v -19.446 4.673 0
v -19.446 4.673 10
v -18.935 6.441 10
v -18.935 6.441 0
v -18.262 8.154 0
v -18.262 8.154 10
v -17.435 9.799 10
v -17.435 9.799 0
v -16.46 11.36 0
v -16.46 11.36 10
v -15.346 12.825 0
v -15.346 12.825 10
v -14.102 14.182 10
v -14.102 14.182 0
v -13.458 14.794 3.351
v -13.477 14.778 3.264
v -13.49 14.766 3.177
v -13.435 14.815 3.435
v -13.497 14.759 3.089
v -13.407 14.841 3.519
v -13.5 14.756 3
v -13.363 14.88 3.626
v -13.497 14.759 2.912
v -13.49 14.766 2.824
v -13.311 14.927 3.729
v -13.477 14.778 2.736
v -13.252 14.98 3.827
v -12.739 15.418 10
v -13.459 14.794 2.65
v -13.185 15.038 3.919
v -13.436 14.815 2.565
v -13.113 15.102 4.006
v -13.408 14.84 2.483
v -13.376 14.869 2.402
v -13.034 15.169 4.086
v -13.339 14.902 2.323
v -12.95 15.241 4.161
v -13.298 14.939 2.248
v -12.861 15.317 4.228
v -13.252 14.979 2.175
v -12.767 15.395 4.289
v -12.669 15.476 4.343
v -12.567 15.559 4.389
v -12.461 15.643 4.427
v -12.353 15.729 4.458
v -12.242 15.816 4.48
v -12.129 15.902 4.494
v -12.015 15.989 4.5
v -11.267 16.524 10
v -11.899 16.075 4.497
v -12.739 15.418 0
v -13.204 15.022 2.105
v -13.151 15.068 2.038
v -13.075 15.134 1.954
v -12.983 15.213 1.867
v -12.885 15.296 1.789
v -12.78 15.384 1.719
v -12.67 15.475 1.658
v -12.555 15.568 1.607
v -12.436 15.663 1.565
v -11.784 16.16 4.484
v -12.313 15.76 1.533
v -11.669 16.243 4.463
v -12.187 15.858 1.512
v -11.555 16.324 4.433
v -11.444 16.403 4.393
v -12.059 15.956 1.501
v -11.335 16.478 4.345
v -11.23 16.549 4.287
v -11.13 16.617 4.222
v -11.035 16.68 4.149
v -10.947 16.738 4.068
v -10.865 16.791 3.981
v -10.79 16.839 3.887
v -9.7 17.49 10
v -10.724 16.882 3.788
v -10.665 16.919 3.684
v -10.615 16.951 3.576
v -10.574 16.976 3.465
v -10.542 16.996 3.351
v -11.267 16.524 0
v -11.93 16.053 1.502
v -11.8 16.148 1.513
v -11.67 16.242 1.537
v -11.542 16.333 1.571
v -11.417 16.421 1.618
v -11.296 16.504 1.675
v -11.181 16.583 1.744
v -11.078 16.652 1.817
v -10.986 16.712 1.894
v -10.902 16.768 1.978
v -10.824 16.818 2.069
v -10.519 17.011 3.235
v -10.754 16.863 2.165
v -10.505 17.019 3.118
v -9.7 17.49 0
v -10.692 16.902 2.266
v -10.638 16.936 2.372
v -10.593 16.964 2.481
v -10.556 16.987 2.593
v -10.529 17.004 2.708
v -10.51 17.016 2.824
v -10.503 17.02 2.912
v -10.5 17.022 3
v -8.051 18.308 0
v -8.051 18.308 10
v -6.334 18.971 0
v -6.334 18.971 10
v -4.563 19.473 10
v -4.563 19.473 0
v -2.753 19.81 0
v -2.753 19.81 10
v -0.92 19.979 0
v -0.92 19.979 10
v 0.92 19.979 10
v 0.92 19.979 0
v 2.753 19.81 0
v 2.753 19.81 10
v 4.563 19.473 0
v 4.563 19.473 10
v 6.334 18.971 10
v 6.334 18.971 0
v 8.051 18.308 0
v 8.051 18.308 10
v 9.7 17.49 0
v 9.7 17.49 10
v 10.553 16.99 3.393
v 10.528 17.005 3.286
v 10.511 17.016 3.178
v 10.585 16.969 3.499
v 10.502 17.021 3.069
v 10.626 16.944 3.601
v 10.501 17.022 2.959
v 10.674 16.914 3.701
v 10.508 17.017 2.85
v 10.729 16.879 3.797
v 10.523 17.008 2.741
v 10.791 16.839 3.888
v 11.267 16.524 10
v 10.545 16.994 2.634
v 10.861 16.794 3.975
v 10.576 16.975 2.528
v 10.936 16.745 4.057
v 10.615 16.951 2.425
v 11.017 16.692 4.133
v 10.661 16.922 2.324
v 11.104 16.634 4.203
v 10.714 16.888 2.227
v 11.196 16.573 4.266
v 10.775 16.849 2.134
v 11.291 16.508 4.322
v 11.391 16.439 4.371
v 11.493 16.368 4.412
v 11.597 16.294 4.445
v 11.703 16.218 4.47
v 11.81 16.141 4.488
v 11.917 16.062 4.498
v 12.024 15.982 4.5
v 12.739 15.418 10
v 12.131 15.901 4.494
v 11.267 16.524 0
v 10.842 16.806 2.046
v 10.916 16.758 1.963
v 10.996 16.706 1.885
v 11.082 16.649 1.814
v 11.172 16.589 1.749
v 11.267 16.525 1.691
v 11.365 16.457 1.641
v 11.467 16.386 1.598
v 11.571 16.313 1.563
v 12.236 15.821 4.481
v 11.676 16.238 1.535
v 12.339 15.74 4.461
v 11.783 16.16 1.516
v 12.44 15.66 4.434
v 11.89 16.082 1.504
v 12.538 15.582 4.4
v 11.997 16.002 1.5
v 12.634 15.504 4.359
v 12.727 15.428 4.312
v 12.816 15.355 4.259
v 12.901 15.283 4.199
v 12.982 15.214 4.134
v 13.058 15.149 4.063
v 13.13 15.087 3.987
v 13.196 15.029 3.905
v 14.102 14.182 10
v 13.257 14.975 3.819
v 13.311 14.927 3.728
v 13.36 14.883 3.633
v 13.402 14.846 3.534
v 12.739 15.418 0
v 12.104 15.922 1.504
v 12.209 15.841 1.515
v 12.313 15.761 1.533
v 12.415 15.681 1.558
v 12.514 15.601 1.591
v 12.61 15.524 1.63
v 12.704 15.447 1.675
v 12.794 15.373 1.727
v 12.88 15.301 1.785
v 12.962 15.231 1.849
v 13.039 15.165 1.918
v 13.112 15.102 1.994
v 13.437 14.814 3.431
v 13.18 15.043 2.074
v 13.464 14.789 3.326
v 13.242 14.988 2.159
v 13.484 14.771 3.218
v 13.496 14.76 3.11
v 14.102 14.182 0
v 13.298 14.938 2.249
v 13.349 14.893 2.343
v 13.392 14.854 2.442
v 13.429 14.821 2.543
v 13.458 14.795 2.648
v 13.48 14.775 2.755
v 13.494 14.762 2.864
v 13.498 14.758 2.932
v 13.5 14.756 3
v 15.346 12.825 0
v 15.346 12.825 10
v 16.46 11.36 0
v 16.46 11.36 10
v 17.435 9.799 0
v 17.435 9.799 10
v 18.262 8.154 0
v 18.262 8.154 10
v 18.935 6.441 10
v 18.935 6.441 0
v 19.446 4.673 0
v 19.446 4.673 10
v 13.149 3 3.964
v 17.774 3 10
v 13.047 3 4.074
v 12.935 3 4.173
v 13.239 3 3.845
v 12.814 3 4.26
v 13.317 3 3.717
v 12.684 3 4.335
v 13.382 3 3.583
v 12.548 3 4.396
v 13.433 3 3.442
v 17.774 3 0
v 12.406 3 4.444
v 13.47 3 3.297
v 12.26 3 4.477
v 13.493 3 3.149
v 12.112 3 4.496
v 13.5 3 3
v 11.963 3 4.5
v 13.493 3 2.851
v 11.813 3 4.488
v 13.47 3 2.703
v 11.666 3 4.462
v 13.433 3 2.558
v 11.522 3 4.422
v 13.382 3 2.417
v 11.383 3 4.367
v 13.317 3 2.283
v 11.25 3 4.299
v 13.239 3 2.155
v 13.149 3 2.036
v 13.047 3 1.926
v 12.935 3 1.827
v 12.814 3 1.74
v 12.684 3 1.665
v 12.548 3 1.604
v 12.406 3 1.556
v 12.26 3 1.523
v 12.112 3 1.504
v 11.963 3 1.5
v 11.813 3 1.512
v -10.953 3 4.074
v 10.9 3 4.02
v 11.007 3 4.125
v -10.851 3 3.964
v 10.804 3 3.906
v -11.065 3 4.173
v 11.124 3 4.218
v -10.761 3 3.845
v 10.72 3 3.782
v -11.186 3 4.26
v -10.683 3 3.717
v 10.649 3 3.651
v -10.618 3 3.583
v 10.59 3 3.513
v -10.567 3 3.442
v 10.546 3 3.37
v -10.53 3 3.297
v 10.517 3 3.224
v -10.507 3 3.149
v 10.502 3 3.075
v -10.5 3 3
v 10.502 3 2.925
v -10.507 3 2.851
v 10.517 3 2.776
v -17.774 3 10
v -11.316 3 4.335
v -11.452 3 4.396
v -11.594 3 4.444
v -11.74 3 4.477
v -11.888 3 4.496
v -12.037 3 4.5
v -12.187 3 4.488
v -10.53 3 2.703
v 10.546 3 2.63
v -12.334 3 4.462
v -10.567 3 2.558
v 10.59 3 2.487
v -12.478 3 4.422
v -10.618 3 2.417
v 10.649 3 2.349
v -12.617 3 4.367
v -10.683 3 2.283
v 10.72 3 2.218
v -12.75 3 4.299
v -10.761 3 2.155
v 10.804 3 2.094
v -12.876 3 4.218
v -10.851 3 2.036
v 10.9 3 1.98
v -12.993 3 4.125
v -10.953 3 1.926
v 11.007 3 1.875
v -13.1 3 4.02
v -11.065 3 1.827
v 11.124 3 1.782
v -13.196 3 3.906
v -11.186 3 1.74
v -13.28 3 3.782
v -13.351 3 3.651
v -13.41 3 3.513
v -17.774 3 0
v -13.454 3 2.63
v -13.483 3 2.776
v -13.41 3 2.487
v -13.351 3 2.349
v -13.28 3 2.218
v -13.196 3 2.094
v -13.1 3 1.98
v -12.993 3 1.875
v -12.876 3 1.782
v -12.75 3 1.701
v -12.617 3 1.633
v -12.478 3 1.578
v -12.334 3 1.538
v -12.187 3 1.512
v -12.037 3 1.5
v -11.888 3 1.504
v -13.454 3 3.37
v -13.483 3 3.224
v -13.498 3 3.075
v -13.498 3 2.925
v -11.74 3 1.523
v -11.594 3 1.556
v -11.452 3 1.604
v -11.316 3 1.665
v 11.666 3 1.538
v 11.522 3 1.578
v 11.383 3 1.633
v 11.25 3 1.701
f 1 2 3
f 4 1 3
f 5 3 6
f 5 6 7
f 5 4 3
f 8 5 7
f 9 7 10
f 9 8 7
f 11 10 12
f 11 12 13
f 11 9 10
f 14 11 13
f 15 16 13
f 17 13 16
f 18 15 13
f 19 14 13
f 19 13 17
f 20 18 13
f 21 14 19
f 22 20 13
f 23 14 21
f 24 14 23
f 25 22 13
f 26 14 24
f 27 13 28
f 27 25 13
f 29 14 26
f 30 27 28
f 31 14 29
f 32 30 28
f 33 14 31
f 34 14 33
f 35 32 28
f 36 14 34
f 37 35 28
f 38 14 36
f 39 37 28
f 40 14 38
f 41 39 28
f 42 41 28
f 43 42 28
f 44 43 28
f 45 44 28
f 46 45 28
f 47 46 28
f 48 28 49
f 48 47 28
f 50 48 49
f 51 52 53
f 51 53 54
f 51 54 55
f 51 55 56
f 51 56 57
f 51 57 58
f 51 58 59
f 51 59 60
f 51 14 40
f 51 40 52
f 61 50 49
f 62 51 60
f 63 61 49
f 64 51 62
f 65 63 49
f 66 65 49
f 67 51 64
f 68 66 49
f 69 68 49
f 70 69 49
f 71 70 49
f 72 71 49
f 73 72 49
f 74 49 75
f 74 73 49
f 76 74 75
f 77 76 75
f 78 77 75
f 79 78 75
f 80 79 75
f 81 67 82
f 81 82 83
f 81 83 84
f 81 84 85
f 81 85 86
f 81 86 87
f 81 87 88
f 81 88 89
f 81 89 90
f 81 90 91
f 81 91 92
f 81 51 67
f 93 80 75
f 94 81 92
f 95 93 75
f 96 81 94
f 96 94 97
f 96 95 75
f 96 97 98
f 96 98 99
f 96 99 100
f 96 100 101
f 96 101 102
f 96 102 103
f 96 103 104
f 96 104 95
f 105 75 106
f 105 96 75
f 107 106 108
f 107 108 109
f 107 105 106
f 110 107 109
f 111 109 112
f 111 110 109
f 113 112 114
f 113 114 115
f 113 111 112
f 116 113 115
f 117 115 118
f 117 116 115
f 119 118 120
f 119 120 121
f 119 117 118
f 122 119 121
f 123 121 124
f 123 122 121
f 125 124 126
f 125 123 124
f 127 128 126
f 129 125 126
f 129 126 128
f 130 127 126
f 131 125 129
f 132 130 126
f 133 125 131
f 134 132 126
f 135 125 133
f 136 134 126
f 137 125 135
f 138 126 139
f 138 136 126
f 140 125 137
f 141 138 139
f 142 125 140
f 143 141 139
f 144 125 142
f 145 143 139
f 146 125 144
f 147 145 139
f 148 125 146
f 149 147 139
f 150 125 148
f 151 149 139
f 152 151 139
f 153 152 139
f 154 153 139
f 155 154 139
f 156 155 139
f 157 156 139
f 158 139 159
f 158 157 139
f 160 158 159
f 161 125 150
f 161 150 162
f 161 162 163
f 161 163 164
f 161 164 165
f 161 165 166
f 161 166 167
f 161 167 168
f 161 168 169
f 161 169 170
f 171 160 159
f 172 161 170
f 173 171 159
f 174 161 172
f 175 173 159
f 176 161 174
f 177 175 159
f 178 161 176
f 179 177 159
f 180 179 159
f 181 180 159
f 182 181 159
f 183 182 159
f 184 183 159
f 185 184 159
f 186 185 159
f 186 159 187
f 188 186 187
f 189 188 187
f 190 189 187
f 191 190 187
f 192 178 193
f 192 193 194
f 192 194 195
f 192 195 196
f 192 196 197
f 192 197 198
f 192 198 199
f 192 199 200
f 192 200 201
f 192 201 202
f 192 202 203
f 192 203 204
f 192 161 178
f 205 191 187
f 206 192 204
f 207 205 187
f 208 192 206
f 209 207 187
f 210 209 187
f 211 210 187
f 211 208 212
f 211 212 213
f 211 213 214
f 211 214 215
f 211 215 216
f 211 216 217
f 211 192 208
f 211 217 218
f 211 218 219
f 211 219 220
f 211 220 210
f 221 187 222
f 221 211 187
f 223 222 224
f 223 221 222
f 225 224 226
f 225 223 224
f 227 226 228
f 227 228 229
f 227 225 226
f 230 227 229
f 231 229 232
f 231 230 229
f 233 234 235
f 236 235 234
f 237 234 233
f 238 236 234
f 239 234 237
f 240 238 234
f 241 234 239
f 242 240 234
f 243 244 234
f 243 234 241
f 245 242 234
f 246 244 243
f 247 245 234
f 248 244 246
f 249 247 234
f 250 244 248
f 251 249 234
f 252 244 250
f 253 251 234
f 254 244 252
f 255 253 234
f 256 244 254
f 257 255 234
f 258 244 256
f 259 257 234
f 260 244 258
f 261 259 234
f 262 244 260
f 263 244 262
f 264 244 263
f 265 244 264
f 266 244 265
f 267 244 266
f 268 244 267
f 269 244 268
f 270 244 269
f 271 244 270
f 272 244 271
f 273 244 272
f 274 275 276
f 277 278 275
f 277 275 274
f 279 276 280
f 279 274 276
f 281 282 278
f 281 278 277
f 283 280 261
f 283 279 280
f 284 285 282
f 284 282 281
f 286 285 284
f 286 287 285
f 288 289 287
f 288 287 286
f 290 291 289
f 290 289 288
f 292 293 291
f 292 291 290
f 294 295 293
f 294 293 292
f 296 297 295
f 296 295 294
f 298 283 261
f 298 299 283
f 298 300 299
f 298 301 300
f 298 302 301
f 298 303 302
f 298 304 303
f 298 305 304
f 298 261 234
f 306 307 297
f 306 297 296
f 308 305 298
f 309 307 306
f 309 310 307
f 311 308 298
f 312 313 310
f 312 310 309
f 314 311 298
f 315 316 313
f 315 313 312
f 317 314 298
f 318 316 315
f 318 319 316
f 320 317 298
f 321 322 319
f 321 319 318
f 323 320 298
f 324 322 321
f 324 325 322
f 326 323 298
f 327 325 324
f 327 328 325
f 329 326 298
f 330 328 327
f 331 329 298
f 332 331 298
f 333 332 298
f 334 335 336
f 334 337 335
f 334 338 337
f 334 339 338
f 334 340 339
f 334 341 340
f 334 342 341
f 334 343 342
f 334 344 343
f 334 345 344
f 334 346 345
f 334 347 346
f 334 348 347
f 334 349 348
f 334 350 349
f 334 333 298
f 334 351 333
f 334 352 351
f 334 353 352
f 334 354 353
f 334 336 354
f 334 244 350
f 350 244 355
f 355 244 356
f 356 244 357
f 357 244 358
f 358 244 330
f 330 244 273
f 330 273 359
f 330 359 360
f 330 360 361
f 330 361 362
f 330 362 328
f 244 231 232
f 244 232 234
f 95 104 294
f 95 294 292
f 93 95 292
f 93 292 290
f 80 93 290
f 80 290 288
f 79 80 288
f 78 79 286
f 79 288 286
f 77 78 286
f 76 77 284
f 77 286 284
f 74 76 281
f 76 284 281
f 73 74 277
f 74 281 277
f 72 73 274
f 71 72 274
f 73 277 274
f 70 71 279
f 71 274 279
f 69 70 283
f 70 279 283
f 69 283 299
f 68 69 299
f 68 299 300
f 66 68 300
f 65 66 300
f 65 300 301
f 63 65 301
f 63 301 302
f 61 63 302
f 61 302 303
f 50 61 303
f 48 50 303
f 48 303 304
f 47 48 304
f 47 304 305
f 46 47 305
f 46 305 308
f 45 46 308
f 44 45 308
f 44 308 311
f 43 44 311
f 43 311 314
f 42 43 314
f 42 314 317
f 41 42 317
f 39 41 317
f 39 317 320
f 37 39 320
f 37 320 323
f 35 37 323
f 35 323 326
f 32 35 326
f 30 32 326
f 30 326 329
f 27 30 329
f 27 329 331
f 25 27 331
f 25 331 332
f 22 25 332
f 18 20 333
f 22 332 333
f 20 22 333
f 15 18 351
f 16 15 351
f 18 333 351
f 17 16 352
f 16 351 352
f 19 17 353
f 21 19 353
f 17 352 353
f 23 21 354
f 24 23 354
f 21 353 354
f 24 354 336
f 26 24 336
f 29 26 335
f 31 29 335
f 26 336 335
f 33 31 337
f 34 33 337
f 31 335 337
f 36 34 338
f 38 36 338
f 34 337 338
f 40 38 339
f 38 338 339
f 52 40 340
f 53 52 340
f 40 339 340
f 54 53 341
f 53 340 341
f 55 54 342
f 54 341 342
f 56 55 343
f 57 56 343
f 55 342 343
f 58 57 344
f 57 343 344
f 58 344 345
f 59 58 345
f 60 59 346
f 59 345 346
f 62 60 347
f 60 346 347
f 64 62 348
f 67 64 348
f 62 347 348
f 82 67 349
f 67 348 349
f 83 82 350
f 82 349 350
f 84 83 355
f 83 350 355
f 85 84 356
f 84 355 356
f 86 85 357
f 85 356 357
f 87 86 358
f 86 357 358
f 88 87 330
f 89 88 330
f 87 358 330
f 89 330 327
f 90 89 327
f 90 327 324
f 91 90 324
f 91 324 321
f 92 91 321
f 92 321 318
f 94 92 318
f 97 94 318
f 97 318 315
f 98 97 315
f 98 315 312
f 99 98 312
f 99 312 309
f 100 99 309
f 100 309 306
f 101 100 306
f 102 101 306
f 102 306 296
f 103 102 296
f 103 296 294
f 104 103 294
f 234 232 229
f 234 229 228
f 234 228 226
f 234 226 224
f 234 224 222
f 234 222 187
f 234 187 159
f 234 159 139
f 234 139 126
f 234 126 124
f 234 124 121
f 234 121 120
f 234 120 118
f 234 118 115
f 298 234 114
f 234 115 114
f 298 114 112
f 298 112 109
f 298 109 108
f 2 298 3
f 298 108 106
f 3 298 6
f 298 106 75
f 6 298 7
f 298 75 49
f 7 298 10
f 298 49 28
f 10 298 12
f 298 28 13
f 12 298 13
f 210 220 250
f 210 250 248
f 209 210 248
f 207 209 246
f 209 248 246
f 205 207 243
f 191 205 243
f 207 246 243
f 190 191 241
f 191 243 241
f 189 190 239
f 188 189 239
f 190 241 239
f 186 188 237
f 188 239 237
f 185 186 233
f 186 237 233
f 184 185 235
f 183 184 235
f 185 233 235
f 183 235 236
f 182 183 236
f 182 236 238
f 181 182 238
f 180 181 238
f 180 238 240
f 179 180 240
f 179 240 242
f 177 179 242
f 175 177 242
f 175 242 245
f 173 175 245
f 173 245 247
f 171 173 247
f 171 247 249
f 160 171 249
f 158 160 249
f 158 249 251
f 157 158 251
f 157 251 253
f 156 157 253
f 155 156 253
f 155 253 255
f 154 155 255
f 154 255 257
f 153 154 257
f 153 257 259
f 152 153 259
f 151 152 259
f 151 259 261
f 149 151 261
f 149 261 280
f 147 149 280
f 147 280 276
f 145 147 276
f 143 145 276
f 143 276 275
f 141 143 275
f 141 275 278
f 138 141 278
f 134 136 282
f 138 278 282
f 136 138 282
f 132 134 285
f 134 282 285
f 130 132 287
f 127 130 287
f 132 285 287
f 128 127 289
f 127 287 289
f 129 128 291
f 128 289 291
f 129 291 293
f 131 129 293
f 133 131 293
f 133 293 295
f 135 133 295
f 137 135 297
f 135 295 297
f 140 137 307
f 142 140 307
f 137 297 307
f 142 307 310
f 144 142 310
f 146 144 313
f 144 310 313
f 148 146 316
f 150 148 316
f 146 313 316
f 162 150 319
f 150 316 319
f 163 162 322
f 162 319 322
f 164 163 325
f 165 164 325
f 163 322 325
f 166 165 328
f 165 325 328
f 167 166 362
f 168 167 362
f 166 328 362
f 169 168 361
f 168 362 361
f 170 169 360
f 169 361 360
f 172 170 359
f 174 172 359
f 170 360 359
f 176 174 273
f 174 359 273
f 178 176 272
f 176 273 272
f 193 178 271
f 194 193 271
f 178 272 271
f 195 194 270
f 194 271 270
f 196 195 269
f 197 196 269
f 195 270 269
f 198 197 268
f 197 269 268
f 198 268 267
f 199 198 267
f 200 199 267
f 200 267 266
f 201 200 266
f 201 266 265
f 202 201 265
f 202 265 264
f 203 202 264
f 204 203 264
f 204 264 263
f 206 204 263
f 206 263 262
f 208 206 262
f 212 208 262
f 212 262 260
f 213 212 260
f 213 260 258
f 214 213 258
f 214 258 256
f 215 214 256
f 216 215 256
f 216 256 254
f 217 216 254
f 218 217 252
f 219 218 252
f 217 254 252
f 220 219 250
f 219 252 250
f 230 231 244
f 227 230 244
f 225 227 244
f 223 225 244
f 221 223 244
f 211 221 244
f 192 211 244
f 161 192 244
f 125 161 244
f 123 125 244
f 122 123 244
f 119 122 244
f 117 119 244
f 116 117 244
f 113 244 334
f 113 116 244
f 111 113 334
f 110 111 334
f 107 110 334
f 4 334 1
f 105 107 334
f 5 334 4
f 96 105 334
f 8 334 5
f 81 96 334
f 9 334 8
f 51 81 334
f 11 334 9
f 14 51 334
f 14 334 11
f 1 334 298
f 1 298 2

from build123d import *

# Parameters (mm, degrees)
EXTRUSION1_DEPTH = 10
ESQUISSE2_R      = 1.5
EXTRUSION2_DEPTH = 18


with BuildPart() as part:
    # Esquisse1 → Extrusion1 (new body)
    with BuildSketch(Plane.XY):
        with BuildLine():
            Line((17.773719933, 3), (-17.773719933, 3))
            Line((-17.773719933, 3), (-19.446474381, 4.672754448))
            ThreePointArc((-19.446474381, 4.672754448), (0, 20), (19.446474381, 4.672754448))
            Line((19.446474381, 4.672754448), (17.773719933, 3))
        make_face()
    extrude(amount=EXTRUSION1_DEPTH)

    # Esquisse2 → Extrusion2 (cut, through all)
    with BuildSketch(Plane.XZ.offset(-3)):
        with Locations((-12, 3)):
            Circle(ESQUISSE2_R)
        with Locations((12, 3)):
            Circle(ESQUISSE2_R)
    extrude(amount=-EXTRUSION2_DEPTH, mode=Mode.SUBTRACT)


solid = part.part
